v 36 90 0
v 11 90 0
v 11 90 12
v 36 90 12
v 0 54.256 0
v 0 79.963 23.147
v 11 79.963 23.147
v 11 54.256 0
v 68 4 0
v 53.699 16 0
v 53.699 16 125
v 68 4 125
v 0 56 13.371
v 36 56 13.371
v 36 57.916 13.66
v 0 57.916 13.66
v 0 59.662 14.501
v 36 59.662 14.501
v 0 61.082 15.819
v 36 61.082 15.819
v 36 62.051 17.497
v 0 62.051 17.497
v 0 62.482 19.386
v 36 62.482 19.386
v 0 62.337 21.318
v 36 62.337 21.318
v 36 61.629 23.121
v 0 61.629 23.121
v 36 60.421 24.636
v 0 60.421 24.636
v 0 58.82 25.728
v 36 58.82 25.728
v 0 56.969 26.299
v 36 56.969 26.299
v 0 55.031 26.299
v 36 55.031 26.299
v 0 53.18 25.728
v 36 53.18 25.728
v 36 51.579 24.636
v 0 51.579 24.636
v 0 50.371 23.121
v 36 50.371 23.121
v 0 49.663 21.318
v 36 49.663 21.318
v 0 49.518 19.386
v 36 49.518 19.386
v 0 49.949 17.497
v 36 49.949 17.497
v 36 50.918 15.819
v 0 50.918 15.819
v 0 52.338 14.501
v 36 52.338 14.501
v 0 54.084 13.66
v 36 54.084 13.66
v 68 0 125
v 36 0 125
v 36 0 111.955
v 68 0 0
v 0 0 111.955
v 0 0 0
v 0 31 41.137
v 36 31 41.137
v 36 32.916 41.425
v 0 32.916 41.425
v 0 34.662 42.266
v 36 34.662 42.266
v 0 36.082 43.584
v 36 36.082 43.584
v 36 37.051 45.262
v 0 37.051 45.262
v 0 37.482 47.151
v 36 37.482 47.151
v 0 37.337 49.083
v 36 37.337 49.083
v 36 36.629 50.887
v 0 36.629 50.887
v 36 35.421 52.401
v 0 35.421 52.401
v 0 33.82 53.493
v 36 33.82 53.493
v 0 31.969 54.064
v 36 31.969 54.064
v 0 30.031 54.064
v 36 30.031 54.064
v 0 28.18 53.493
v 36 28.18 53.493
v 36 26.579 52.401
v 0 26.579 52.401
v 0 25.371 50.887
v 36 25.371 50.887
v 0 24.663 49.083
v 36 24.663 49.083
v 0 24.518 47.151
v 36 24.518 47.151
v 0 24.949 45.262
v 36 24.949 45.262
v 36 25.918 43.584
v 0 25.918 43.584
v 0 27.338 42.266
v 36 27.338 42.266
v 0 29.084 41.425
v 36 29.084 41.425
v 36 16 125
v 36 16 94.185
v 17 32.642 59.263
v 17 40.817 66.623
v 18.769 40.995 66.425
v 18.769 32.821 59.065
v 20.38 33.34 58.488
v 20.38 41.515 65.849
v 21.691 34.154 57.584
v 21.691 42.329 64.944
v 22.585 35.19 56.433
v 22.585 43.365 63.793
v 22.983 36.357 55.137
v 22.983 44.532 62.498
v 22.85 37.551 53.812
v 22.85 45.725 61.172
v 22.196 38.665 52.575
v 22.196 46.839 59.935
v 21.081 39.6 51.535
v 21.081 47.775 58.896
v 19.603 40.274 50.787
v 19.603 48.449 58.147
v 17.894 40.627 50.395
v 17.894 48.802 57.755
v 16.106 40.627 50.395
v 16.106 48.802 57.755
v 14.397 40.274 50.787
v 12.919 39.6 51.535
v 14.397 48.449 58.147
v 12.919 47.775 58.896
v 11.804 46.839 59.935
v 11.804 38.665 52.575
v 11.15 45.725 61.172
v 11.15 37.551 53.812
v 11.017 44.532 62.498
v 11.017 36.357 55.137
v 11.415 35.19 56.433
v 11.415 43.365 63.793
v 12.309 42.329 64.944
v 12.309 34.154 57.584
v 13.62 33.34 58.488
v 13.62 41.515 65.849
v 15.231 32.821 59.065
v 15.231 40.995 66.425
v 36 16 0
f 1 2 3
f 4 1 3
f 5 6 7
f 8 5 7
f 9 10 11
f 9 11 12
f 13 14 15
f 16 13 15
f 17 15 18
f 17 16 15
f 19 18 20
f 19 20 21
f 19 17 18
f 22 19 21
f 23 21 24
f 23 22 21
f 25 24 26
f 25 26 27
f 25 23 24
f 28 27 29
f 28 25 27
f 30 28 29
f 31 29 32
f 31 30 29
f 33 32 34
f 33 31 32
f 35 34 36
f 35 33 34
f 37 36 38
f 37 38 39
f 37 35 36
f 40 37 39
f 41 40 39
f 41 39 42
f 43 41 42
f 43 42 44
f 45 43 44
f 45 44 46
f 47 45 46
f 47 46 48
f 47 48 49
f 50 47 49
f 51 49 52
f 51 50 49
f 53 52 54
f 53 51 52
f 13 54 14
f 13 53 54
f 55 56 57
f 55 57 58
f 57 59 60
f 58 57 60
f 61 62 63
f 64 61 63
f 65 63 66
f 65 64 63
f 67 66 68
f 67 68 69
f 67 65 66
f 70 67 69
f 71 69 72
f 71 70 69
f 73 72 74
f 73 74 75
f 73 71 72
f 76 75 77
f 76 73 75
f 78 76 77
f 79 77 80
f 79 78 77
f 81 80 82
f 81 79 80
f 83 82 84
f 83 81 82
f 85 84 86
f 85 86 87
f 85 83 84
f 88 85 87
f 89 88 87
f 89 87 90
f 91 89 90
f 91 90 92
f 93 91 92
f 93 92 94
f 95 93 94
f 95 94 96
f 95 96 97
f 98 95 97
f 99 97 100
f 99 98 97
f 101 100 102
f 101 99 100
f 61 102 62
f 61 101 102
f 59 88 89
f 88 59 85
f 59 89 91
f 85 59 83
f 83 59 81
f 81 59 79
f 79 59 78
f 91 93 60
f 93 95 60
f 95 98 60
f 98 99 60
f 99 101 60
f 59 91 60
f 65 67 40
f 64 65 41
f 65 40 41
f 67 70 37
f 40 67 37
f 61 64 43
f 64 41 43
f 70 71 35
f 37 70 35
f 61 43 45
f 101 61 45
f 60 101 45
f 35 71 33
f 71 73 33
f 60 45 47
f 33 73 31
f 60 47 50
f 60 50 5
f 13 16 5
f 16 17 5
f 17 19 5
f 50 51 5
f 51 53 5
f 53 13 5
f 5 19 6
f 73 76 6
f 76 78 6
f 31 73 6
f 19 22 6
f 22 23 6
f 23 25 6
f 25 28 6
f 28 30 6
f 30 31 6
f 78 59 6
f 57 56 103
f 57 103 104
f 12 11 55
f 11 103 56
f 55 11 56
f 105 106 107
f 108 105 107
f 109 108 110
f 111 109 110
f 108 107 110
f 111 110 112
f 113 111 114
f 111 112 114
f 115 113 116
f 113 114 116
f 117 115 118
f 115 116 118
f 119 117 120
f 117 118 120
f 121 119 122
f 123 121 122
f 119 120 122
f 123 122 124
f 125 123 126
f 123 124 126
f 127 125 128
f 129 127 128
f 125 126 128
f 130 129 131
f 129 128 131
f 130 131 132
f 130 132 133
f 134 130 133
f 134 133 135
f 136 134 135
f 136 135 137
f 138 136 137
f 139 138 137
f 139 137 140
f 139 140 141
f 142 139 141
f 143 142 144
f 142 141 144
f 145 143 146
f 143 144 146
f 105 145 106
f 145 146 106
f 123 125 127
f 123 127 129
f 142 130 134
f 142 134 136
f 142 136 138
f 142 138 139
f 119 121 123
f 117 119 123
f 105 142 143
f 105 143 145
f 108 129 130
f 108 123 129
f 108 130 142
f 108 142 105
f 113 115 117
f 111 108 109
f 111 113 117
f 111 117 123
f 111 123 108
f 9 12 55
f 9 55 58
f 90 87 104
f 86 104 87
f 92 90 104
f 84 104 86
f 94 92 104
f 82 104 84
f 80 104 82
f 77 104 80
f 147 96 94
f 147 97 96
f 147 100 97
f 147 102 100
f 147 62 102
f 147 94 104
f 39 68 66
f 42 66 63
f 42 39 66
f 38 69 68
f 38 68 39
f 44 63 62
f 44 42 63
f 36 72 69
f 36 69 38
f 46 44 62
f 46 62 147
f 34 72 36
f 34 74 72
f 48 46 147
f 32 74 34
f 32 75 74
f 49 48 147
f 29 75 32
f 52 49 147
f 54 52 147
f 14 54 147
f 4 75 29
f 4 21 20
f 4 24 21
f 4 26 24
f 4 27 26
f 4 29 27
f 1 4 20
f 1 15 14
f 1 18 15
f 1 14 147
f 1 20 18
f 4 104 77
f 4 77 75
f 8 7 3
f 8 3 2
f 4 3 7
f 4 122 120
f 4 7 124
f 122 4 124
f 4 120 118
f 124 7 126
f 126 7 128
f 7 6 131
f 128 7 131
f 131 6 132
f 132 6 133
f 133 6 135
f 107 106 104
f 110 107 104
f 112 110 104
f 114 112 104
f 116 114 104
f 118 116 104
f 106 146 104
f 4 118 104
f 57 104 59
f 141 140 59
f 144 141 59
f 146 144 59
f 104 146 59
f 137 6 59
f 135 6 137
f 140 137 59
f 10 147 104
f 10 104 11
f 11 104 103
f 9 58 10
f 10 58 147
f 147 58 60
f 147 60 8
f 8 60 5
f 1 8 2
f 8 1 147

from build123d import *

# Parameters (mm, degrees)
SKETCH1_R               = 6.5
BOSS_EXTRUDE1_DEPTH     = 36
BOSS_EXTRUDE2_START     = 36
BOSS_EXTRUDE2_DEPTH     = 32
CUT_EXTRUDE1_REACH      = 117.453
SKETCH3_W               = 11
SKETCH3_H               = 15
SKETCH3_H_2             = 8.917737905
SKETCH3_6_R             = 6
CUT_EXTRUDE3_DEPTH      = 11
CUT_EXTRUDE4_DEPTH      = 169.371612809
CUT_EXTRUDE4_DEPTH_BACK = 169.371612809


with BuildPart() as part:
    # Sketch1 → Boss-Extrude1 (new body)
    with BuildSketch(Plane(origin=(0, 0, 0), x_dir=(0, 0, -1), z_dir=(1, 0, 0))):
        Polygon((-12, 90), (-111.955126335, 0), (0, 0), (0, 90), align=None)
        with Locations((-47.636607378, 31)):
            Circle(SKETCH1_R, mode=Mode.SUBTRACT)
        with Locations((-19.871294507, 56)):
            Circle(SKETCH1_R, mode=Mode.SUBTRACT)
    extrude(amount=BOSS_EXTRUDE1_DEPTH)

    # Sketch1<4> → Boss-Extrude2 (add)
    with BuildSketch(Plane(origin=(0, 0, 0), x_dir=(0, 0, -1), z_dir=(1, 0, 0)).offset(BOSS_EXTRUDE2_START)):
        Polygon((-111.955126335, 0), (-94.185326097, 16), (-125, 16), (-125, 0), align=None)
        Polygon((0, 0), (0, 16), (-94.185326097, 16), (-111.955126335, 0), align=None)
    extrude(amount=BOSS_EXTRUDE2_DEPTH)

    # Cut-Extrude1: up to this plane
    cut_extrude1_end = Plane(origin=(36, 0, 0), z_dir=(0, 0, 1))
    # Sketch3 → Cut-Extrude1 (cut, up to the surface)
    with BuildSketch(Plane(origin=(0, 55.670912219, 50.126314512), x_dir=(1, 0, 0), z_dir=(0, 0.7431448254773979, 0.6691306063588541)), mode=Mode.PRIVATE) as cut_extrude1_sk1:
        with Locations((5.5, 43.804016667)):
            Rectangle(SKETCH3_W, SKETCH3_H)
    cut_extrude1_tool1 = split(extrude(cut_extrude1_sk1.sketch, amount=-CUT_EXTRUDE1_REACH, mode=Mode.PRIVATE), bisect_by=cut_extrude1_end, keep=Keep.BOTH, mode=Mode.PRIVATE)
    add(cut_extrude1_tool1.solids().sort_by_distance((5.5, 84.98152, 17.573586))[0], mode=Mode.SUBTRACT)
    # Sketch3 → Cut-Extrude1 (cut, up to the surface)
    with BuildSketch(Plane(origin=(0, 55.670912219, 50.126314512), x_dir=(1, 0, 0), z_dir=(0, 0.7431448254773979, 0.6691306063588541)), mode=Mode.PRIVATE) as cut_extrude1_sk2:
        with Locations((5.5, 55.76288562)):
            Rectangle(SKETCH3_W, SKETCH3_H_2)
    cut_extrude1_tool2 = split(extrude(cut_extrude1_sk2.sketch, amount=-CUT_EXTRUDE1_REACH, mode=Mode.PRIVATE), bisect_by=cut_extrude1_end, keep=Keep.BOTH, mode=Mode.PRIVATE)
    add(cut_extrude1_tool2.solids().sort_by_distance((5.5, 92.983566, 8.686415))[0], mode=Mode.SUBTRACT)

    # Sketch3<6> → Cut-Extrude3 (cut)
    with BuildSketch(Plane(origin=(0, 55.670912219, 50.126314512), x_dir=(1, 0, 0), z_dir=(0, 0.7431448254773979, 0.6691306063588541))):
        with Locations(Location((17, -16.198872821, 0), (0, 0, 270))):
            Circle(SKETCH3_6_R)
    extrude(amount=-CUT_EXTRUDE3_DEPTH, mode=Mode.SUBTRACT)

    # Sketch4 → Cut-Extrude4 (cut, two sides: drawn at the far end of the back side and taken through both)
    with BuildSketch(Plane.XY.offset(125).offset(-CUT_EXTRUDE4_DEPTH_BACK)):
        Polygon((53.698956889, 16), (68, 4), (68, 16), align=None)
    extrude(amount=CUT_EXTRUDE4_DEPTH + CUT_EXTRUDE4_DEPTH_BACK, mode=Mode.SUBTRACT)


solid = part.part
